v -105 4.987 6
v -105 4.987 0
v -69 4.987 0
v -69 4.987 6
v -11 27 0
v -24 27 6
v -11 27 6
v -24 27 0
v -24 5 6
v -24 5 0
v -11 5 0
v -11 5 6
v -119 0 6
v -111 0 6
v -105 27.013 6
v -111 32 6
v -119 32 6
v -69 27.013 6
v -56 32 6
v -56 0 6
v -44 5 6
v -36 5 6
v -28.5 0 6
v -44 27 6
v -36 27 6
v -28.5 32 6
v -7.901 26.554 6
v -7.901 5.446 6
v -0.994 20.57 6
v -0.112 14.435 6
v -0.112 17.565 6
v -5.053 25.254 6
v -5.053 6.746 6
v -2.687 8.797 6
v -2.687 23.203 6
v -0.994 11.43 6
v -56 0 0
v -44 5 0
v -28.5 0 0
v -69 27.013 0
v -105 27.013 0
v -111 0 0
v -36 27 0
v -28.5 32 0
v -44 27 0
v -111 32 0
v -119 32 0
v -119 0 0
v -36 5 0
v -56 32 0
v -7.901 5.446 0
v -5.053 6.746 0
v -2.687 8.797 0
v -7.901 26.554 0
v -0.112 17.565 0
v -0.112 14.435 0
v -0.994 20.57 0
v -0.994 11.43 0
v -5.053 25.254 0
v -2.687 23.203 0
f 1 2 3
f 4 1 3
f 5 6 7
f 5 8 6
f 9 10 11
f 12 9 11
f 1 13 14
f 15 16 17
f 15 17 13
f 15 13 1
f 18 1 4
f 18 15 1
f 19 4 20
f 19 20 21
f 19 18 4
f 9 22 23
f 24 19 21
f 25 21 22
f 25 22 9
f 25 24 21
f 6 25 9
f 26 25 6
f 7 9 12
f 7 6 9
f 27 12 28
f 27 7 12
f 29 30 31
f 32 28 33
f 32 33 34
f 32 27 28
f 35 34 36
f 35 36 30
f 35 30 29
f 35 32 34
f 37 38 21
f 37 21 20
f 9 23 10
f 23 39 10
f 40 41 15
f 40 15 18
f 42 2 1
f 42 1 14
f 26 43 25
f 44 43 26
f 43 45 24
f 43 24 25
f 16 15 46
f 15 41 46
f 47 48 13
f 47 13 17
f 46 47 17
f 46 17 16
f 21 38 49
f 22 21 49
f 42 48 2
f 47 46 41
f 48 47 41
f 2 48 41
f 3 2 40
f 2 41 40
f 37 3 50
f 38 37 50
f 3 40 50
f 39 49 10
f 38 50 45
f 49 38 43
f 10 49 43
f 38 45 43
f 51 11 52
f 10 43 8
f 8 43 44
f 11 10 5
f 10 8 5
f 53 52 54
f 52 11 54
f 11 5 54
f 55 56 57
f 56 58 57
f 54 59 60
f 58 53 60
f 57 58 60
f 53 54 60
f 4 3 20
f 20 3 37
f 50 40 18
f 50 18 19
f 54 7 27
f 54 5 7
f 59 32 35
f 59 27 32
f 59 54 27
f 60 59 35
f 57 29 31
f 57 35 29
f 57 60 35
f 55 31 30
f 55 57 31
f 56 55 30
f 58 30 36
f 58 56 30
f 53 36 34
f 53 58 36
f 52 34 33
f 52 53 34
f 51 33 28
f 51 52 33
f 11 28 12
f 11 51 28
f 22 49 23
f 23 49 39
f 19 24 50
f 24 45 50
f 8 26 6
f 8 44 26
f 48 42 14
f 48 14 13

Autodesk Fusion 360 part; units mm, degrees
sketch "Sketch1" plane through (0, 0, 0) normal (0, 0, 1) x (1, 0, 0)
  line L0 (0, 0) -> (-119, 0)
  line L1 (-119, 0) -> (-119, 32)
  line L2 (-119, 32) -> (0, 32)
  line L3 (0, 32) -> (0, 0)
  line L4 (-105, 27.0131) -> (-111, 32)
  line L5 (-105, 27.0131) -> (-69, 27.0131)
  line L6 (-69, 27.0131) -> (-56, 32)
  line L7 (-105, 4.9869) -> (-69, 4.9869)
  line L8 (-105, 4.9869) -> (-111, 0)
  line L9 (-69, 4.9869) -> (-56, 0)
  line L10 (-44, 27) -> (-36, 27)
  line L11 (-44, 27) -> (-56, 32)
  line L12 (-36, 27) -> (-28.5, 32)
  line L13 (-28.5, 32) -> (-24, 27)
  line L14 (-24, 27) -> (0, 27)
  line L15 (-24, 5) -> (0, 5)
  line L16 (-28.5, 0) -> (-24, 5)
  line L17 (-36, 5) -> (-28.5, 0)
  line L18 (-44, 5) -> (-36, 5)
  line L19 (-44, 5) -> (-56, 0)
  circle A0 centre (-11, 16) radius 11
  dimension "d1" = 119
  dimension "d2" = 32
  dimension "d5" = 8
  dimension "d14" = 14
  dimension "d16" = 36
  dimension "d17" = 63
  dimension "d18" = 8
  dimension "d19" = 25
  dimension "d21" = 12
extrude "Extrude1" add sketch "Sketch1" along normal blind 6 contours L0 L1 L2 L4 L5 L6 L7 L8 L9 L10 L11 L12 L13 L14 L15 L16 L17 L18 L19 A0 | A0
equation "d16 = 50 mm - 14 mm"
